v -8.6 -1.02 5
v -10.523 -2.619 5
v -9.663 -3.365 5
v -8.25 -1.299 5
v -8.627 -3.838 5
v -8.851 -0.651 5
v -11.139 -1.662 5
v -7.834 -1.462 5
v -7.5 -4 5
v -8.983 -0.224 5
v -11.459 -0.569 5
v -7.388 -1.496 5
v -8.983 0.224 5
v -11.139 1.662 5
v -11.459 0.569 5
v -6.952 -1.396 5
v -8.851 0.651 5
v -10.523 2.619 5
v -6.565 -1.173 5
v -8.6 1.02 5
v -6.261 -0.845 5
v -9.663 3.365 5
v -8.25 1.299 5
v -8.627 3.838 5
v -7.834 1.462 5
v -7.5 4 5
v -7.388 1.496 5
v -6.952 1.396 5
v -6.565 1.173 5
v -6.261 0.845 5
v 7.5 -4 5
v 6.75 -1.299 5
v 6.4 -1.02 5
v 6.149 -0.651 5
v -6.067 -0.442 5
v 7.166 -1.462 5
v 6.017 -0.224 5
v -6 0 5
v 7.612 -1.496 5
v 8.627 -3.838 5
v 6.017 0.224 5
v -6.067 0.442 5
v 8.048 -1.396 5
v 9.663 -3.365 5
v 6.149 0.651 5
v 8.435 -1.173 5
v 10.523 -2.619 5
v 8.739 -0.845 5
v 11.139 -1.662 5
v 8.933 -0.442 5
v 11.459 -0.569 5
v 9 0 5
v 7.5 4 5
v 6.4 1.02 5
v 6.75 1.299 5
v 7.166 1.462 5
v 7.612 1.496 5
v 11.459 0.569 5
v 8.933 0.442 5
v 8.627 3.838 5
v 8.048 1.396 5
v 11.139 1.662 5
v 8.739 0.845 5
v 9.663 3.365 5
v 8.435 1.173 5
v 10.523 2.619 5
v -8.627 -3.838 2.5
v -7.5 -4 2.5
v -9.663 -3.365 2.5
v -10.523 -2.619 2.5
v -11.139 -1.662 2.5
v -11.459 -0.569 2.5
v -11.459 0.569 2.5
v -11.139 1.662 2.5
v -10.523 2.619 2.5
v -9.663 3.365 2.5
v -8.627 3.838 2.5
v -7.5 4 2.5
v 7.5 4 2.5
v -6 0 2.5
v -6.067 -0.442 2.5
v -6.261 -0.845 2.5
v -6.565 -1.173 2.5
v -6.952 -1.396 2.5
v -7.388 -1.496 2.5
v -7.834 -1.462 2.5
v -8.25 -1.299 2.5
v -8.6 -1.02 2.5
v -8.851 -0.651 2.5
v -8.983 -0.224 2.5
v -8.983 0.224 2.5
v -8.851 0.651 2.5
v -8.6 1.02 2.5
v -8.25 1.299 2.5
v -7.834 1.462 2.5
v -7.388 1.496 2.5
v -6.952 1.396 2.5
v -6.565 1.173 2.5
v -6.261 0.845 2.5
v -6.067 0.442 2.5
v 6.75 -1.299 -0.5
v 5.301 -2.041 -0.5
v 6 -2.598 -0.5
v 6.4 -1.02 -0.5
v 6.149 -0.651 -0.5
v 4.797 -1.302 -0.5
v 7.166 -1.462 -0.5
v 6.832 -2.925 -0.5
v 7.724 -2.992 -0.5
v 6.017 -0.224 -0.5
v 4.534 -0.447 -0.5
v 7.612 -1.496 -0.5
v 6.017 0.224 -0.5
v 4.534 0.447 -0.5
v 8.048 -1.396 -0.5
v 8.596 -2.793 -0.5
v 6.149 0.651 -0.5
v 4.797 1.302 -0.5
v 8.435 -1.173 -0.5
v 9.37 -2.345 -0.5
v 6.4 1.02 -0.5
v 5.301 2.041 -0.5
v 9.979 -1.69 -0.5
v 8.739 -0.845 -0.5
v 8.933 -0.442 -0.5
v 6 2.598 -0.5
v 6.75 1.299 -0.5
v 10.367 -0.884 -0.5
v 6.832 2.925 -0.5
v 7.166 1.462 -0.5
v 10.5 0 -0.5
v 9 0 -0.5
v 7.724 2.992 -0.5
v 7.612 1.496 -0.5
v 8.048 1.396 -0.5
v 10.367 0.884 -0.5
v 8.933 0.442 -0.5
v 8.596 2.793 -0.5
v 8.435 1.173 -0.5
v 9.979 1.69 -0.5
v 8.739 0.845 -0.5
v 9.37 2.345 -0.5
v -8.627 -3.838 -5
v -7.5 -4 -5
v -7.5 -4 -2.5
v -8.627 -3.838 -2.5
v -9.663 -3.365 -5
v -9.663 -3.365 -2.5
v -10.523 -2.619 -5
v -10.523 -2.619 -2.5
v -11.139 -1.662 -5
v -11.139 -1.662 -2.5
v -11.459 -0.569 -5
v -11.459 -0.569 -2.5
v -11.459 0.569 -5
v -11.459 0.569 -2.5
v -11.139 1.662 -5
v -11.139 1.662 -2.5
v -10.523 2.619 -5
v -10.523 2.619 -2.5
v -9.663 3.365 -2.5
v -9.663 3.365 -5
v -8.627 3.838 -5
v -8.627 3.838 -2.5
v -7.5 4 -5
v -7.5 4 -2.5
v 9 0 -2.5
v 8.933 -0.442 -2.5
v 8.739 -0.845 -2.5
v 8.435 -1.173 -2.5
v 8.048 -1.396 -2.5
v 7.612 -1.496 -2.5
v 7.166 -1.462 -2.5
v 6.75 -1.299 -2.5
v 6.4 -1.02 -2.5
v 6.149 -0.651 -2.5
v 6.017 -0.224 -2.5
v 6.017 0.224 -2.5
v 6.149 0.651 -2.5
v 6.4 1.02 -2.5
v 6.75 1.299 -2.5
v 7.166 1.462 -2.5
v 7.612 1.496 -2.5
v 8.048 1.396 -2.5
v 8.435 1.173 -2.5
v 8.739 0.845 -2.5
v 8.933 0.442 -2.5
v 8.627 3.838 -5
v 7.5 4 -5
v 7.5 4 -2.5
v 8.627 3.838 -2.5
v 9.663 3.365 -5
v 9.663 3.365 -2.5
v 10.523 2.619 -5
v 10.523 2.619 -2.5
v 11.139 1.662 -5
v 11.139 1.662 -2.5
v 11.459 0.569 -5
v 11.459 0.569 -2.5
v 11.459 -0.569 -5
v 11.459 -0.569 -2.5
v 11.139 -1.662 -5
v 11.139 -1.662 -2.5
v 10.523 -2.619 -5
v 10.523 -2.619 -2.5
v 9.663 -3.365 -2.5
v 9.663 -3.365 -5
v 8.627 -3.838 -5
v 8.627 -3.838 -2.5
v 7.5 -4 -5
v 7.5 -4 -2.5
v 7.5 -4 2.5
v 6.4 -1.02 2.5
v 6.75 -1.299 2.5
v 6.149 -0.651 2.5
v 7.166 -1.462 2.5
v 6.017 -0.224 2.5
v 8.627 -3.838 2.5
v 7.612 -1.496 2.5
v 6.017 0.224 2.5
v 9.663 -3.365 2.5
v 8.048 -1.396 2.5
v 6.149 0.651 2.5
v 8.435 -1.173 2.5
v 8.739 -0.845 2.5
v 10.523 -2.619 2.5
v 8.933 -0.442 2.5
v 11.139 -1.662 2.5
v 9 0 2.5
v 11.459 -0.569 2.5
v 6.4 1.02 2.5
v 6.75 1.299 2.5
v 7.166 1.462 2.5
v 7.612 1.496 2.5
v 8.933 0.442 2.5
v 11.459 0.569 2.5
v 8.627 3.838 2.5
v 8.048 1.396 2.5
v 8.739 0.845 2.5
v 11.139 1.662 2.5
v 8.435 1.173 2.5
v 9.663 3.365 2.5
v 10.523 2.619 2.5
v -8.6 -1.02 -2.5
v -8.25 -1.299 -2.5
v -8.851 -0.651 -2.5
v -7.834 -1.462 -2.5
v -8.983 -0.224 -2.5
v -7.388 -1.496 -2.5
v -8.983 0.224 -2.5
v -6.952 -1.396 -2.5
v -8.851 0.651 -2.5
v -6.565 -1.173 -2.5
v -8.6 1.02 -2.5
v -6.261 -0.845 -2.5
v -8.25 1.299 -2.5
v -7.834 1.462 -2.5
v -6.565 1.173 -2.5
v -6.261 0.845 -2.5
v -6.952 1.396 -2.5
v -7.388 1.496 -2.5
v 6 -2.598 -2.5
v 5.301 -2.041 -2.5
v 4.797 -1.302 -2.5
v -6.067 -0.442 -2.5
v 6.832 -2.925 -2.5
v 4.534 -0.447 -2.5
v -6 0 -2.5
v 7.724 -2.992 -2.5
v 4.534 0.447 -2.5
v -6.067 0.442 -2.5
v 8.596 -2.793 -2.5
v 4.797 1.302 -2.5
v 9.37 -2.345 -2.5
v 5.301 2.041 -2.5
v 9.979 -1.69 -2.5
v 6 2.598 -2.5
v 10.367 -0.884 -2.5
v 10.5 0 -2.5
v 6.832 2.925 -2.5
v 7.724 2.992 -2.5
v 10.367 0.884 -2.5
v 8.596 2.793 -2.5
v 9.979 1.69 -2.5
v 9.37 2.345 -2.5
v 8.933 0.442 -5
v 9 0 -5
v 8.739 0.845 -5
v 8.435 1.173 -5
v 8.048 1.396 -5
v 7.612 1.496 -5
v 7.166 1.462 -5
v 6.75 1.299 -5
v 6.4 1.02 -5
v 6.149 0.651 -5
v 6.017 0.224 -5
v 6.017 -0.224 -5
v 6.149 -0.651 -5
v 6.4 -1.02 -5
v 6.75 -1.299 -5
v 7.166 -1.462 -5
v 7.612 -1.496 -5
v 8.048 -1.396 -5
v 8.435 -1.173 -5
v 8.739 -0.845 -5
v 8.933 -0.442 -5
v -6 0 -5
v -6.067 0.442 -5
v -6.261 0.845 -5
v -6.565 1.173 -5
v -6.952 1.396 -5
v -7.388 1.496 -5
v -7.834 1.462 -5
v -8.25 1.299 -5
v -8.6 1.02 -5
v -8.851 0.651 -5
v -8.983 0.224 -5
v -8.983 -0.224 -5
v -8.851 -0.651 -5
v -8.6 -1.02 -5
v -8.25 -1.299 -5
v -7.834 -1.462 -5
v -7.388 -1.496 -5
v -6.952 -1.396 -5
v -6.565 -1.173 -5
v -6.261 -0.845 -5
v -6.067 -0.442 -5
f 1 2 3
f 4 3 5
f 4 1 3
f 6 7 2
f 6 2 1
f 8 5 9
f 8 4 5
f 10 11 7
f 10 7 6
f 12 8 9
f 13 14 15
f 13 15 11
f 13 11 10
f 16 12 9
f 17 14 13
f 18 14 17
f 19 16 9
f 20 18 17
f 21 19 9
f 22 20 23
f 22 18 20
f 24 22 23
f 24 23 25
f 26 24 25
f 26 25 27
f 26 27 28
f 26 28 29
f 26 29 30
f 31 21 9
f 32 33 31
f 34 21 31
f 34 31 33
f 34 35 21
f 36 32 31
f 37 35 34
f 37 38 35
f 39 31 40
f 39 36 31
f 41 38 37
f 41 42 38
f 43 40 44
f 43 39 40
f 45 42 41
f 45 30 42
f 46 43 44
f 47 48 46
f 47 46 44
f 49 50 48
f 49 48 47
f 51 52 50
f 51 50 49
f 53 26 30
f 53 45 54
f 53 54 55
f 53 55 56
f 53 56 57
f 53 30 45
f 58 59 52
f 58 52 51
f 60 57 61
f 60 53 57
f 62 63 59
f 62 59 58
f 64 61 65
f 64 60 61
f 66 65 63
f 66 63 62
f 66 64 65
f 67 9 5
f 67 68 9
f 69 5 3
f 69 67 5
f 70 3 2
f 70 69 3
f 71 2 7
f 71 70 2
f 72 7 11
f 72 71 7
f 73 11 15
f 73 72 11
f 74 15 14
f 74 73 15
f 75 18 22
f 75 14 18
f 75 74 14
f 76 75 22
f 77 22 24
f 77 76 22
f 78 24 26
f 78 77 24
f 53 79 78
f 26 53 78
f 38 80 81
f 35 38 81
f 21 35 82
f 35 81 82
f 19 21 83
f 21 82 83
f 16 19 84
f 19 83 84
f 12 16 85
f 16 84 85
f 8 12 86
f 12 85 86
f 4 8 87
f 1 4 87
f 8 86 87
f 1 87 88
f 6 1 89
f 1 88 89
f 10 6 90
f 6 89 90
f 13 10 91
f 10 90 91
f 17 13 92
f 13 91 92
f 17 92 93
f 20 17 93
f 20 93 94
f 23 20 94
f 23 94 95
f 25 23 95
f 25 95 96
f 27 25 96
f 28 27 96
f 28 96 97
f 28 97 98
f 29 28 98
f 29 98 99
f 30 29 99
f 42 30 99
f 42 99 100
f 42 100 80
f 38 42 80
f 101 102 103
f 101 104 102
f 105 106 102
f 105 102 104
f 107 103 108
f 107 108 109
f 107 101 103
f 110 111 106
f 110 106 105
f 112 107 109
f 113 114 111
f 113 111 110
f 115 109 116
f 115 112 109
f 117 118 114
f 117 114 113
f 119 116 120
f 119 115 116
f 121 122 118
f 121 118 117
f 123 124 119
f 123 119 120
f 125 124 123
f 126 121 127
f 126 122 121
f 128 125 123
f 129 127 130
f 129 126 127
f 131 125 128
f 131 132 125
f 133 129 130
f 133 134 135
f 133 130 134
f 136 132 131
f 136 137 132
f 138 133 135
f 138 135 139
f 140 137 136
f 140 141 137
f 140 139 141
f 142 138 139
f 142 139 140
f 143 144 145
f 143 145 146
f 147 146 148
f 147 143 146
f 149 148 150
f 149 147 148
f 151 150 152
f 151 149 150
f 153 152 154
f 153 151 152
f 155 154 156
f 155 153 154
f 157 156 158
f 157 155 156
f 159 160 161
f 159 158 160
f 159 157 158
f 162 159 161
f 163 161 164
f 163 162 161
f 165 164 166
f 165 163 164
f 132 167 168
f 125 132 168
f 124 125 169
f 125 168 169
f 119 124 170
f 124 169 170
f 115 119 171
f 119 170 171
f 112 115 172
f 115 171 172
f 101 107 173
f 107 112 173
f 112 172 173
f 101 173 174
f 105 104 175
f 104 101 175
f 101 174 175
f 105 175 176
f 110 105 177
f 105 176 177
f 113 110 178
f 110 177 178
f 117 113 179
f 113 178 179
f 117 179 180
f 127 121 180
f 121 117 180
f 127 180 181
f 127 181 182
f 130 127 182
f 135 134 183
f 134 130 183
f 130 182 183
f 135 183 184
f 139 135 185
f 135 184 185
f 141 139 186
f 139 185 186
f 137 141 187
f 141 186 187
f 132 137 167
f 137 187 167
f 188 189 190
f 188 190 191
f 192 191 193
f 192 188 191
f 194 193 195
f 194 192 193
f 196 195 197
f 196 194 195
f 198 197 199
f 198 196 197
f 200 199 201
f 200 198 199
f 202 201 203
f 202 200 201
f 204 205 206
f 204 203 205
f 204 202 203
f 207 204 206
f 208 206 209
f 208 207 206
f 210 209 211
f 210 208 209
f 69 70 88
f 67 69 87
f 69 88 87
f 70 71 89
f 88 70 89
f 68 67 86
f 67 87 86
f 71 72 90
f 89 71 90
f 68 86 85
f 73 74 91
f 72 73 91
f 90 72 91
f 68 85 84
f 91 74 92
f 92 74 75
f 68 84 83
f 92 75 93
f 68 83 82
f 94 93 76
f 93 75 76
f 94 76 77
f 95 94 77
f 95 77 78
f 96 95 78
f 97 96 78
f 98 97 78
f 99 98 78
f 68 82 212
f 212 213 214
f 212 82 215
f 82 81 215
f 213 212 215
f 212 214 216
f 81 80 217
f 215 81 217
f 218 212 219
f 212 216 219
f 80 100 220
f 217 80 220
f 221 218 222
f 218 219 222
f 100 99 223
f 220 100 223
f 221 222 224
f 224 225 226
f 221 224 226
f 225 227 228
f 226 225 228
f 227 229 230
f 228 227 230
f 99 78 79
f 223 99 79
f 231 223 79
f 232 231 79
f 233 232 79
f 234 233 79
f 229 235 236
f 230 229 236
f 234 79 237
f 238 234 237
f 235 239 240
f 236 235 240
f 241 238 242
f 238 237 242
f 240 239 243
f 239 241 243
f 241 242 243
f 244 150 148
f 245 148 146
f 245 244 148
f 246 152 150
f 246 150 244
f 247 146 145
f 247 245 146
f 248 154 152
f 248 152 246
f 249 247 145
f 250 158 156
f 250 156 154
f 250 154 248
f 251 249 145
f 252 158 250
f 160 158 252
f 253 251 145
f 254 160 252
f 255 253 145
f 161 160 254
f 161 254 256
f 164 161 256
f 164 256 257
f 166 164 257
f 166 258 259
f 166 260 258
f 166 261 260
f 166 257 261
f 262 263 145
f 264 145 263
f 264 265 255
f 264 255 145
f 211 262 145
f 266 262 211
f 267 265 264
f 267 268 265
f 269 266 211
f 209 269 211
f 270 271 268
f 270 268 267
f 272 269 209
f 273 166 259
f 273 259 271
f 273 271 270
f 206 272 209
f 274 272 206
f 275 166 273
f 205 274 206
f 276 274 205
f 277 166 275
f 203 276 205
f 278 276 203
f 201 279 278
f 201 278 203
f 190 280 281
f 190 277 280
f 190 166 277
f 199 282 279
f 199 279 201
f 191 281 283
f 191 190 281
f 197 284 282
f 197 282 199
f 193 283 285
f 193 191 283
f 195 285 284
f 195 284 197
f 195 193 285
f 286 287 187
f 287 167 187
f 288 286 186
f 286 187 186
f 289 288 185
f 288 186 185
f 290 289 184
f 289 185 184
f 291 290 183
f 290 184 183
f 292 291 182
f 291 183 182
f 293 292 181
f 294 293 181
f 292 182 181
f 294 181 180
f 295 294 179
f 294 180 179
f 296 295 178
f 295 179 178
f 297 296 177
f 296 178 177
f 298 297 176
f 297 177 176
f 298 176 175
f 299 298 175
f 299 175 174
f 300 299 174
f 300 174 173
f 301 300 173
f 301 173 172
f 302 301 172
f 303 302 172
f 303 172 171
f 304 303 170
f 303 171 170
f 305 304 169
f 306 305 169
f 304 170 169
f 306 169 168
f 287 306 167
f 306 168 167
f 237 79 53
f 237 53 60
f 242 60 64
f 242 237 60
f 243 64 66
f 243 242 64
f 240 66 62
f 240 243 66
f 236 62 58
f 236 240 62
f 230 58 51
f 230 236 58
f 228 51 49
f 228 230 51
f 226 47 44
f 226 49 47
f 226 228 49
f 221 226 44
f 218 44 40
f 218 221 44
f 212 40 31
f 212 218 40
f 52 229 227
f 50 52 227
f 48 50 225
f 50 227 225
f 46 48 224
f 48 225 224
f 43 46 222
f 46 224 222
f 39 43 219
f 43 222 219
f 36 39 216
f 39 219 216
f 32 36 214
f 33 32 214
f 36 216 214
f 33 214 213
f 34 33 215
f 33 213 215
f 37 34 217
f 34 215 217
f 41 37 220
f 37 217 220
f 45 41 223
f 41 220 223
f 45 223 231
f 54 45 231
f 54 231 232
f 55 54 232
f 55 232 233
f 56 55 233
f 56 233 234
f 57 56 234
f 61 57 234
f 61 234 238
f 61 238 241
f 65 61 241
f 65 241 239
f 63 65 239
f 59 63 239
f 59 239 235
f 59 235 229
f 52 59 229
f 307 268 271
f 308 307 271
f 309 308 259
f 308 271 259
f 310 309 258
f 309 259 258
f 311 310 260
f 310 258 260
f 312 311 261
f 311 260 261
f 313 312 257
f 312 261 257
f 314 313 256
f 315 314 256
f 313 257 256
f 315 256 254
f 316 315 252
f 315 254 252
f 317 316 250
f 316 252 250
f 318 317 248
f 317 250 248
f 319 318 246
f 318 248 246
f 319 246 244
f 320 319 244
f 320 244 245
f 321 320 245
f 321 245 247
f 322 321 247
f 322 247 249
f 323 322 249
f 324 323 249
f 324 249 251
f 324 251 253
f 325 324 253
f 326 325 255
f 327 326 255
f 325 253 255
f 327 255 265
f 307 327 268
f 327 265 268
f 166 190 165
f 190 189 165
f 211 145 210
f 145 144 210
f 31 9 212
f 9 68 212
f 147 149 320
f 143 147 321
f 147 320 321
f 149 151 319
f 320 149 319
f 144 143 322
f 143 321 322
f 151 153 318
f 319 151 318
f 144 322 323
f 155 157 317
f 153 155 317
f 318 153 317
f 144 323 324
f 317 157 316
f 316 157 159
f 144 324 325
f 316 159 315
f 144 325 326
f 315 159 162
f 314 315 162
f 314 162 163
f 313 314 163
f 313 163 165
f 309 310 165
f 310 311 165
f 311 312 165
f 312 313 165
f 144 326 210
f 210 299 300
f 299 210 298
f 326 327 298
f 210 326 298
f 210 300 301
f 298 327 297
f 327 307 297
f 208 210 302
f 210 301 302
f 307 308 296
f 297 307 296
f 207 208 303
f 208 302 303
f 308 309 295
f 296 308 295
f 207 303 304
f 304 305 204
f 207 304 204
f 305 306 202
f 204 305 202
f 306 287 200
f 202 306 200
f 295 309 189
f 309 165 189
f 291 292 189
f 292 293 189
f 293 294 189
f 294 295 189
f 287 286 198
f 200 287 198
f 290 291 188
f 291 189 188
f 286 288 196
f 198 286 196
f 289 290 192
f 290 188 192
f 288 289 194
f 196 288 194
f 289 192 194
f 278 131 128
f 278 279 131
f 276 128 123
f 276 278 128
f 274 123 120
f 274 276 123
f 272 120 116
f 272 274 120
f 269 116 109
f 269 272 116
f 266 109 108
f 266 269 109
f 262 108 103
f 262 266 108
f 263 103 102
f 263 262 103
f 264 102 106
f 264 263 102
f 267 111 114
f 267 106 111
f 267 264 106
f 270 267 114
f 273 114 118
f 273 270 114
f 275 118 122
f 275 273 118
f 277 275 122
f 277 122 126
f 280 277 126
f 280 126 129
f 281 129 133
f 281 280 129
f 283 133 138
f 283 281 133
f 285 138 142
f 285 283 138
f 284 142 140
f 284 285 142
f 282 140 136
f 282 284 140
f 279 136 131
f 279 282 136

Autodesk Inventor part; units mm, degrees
ref_plane "YZ Plane" through (0, 0, 0) normal (1, 0, 0) x (0, 1, 0)
ref_plane "XZ Plane" through (0, 0, 0) normal (0, 1, 0) x (-1, 0, 0)
ref_plane "XY Plane" through (0, 0, 0) normal (0, 0, 1) x (1, 0, 0)
sketch "スケッチ1" plane through (0, 0, 0) normal (0, 0, 1) x (1, 0, 0)
  line L0 (-7.5, 0) -> (7.5, 0) construction
  line L1 (-7.5, -4) -> (7.5, -4)
  line L2 (7.5, 4) -> (-7.5, 4)
  arc A0 (-7.5, 4) -> (-7.5, -4) centre (-7.5, 0) ccw
  arc A1 (7.5, -4) -> (7.5, 4) centre (7.5, 0) ccw
  point P0 (0, 0)
  point P1 (0, 0)
  dimension "d0" = 4
  dimension "d1" = 15
extrude "押し出し1" add sketch "スケッチ1" along normal mid plane 10
sketch "スケッチ2" plane through (0, 0, 0) normal (0, 0, 1) x (1, 0, 0)
  line L0 (7.5, -4) -> (-7.5, -4) projected
  arc A0 (-7.5, 4) -> (-7.5, -4) centre (-7.5, 0) ccw projected
  line L1 (-7.5, 4) -> (7.5, 4) projected
  arc A1 (7.5, -4) -> (7.5, 4) centre (7.5, 0) ccw projected
  point P0 (0, 0)
extrude "押し出し2" cut sketch "スケッチ2" along normal mid plane 5
sketch "スケッチ3" plane through (0, 0, 0) normal (0, 0, 1) x (1, 0, 0)
  circle A0 centre (-7.5, 0) radius 1.5
  circle A1 centre (7.5, 0) radius 1.5
  arc A2 (-7.5, 4) -> (-7.5, -4) centre (-7.5, 0) ccw projected
  arc A3 (7.5, -4) -> (7.5, 4) centre (7.5, 0) ccw projected
  point P0 (0, 0)
  dimension "d6" = 3
  dimension "d7" = 3
extrude "押し出し3" cut sketch "スケッチ3" along normal through all both and the other way through all
sketch "スケッチ4" plane through (0, 0, -2.5) normal (0, 0, 1) x (1, 0, 0)
  circle A0 centre (7.5, 0) radius 1.5 projected
  circle A1 centre (7.5, 0) radius 3
  point P0 (0, 0)
  dimension "d10" = 1.5
extrude "押し出し4" add sketch "スケッチ4" along normal blind 2
properties part number "joint"
